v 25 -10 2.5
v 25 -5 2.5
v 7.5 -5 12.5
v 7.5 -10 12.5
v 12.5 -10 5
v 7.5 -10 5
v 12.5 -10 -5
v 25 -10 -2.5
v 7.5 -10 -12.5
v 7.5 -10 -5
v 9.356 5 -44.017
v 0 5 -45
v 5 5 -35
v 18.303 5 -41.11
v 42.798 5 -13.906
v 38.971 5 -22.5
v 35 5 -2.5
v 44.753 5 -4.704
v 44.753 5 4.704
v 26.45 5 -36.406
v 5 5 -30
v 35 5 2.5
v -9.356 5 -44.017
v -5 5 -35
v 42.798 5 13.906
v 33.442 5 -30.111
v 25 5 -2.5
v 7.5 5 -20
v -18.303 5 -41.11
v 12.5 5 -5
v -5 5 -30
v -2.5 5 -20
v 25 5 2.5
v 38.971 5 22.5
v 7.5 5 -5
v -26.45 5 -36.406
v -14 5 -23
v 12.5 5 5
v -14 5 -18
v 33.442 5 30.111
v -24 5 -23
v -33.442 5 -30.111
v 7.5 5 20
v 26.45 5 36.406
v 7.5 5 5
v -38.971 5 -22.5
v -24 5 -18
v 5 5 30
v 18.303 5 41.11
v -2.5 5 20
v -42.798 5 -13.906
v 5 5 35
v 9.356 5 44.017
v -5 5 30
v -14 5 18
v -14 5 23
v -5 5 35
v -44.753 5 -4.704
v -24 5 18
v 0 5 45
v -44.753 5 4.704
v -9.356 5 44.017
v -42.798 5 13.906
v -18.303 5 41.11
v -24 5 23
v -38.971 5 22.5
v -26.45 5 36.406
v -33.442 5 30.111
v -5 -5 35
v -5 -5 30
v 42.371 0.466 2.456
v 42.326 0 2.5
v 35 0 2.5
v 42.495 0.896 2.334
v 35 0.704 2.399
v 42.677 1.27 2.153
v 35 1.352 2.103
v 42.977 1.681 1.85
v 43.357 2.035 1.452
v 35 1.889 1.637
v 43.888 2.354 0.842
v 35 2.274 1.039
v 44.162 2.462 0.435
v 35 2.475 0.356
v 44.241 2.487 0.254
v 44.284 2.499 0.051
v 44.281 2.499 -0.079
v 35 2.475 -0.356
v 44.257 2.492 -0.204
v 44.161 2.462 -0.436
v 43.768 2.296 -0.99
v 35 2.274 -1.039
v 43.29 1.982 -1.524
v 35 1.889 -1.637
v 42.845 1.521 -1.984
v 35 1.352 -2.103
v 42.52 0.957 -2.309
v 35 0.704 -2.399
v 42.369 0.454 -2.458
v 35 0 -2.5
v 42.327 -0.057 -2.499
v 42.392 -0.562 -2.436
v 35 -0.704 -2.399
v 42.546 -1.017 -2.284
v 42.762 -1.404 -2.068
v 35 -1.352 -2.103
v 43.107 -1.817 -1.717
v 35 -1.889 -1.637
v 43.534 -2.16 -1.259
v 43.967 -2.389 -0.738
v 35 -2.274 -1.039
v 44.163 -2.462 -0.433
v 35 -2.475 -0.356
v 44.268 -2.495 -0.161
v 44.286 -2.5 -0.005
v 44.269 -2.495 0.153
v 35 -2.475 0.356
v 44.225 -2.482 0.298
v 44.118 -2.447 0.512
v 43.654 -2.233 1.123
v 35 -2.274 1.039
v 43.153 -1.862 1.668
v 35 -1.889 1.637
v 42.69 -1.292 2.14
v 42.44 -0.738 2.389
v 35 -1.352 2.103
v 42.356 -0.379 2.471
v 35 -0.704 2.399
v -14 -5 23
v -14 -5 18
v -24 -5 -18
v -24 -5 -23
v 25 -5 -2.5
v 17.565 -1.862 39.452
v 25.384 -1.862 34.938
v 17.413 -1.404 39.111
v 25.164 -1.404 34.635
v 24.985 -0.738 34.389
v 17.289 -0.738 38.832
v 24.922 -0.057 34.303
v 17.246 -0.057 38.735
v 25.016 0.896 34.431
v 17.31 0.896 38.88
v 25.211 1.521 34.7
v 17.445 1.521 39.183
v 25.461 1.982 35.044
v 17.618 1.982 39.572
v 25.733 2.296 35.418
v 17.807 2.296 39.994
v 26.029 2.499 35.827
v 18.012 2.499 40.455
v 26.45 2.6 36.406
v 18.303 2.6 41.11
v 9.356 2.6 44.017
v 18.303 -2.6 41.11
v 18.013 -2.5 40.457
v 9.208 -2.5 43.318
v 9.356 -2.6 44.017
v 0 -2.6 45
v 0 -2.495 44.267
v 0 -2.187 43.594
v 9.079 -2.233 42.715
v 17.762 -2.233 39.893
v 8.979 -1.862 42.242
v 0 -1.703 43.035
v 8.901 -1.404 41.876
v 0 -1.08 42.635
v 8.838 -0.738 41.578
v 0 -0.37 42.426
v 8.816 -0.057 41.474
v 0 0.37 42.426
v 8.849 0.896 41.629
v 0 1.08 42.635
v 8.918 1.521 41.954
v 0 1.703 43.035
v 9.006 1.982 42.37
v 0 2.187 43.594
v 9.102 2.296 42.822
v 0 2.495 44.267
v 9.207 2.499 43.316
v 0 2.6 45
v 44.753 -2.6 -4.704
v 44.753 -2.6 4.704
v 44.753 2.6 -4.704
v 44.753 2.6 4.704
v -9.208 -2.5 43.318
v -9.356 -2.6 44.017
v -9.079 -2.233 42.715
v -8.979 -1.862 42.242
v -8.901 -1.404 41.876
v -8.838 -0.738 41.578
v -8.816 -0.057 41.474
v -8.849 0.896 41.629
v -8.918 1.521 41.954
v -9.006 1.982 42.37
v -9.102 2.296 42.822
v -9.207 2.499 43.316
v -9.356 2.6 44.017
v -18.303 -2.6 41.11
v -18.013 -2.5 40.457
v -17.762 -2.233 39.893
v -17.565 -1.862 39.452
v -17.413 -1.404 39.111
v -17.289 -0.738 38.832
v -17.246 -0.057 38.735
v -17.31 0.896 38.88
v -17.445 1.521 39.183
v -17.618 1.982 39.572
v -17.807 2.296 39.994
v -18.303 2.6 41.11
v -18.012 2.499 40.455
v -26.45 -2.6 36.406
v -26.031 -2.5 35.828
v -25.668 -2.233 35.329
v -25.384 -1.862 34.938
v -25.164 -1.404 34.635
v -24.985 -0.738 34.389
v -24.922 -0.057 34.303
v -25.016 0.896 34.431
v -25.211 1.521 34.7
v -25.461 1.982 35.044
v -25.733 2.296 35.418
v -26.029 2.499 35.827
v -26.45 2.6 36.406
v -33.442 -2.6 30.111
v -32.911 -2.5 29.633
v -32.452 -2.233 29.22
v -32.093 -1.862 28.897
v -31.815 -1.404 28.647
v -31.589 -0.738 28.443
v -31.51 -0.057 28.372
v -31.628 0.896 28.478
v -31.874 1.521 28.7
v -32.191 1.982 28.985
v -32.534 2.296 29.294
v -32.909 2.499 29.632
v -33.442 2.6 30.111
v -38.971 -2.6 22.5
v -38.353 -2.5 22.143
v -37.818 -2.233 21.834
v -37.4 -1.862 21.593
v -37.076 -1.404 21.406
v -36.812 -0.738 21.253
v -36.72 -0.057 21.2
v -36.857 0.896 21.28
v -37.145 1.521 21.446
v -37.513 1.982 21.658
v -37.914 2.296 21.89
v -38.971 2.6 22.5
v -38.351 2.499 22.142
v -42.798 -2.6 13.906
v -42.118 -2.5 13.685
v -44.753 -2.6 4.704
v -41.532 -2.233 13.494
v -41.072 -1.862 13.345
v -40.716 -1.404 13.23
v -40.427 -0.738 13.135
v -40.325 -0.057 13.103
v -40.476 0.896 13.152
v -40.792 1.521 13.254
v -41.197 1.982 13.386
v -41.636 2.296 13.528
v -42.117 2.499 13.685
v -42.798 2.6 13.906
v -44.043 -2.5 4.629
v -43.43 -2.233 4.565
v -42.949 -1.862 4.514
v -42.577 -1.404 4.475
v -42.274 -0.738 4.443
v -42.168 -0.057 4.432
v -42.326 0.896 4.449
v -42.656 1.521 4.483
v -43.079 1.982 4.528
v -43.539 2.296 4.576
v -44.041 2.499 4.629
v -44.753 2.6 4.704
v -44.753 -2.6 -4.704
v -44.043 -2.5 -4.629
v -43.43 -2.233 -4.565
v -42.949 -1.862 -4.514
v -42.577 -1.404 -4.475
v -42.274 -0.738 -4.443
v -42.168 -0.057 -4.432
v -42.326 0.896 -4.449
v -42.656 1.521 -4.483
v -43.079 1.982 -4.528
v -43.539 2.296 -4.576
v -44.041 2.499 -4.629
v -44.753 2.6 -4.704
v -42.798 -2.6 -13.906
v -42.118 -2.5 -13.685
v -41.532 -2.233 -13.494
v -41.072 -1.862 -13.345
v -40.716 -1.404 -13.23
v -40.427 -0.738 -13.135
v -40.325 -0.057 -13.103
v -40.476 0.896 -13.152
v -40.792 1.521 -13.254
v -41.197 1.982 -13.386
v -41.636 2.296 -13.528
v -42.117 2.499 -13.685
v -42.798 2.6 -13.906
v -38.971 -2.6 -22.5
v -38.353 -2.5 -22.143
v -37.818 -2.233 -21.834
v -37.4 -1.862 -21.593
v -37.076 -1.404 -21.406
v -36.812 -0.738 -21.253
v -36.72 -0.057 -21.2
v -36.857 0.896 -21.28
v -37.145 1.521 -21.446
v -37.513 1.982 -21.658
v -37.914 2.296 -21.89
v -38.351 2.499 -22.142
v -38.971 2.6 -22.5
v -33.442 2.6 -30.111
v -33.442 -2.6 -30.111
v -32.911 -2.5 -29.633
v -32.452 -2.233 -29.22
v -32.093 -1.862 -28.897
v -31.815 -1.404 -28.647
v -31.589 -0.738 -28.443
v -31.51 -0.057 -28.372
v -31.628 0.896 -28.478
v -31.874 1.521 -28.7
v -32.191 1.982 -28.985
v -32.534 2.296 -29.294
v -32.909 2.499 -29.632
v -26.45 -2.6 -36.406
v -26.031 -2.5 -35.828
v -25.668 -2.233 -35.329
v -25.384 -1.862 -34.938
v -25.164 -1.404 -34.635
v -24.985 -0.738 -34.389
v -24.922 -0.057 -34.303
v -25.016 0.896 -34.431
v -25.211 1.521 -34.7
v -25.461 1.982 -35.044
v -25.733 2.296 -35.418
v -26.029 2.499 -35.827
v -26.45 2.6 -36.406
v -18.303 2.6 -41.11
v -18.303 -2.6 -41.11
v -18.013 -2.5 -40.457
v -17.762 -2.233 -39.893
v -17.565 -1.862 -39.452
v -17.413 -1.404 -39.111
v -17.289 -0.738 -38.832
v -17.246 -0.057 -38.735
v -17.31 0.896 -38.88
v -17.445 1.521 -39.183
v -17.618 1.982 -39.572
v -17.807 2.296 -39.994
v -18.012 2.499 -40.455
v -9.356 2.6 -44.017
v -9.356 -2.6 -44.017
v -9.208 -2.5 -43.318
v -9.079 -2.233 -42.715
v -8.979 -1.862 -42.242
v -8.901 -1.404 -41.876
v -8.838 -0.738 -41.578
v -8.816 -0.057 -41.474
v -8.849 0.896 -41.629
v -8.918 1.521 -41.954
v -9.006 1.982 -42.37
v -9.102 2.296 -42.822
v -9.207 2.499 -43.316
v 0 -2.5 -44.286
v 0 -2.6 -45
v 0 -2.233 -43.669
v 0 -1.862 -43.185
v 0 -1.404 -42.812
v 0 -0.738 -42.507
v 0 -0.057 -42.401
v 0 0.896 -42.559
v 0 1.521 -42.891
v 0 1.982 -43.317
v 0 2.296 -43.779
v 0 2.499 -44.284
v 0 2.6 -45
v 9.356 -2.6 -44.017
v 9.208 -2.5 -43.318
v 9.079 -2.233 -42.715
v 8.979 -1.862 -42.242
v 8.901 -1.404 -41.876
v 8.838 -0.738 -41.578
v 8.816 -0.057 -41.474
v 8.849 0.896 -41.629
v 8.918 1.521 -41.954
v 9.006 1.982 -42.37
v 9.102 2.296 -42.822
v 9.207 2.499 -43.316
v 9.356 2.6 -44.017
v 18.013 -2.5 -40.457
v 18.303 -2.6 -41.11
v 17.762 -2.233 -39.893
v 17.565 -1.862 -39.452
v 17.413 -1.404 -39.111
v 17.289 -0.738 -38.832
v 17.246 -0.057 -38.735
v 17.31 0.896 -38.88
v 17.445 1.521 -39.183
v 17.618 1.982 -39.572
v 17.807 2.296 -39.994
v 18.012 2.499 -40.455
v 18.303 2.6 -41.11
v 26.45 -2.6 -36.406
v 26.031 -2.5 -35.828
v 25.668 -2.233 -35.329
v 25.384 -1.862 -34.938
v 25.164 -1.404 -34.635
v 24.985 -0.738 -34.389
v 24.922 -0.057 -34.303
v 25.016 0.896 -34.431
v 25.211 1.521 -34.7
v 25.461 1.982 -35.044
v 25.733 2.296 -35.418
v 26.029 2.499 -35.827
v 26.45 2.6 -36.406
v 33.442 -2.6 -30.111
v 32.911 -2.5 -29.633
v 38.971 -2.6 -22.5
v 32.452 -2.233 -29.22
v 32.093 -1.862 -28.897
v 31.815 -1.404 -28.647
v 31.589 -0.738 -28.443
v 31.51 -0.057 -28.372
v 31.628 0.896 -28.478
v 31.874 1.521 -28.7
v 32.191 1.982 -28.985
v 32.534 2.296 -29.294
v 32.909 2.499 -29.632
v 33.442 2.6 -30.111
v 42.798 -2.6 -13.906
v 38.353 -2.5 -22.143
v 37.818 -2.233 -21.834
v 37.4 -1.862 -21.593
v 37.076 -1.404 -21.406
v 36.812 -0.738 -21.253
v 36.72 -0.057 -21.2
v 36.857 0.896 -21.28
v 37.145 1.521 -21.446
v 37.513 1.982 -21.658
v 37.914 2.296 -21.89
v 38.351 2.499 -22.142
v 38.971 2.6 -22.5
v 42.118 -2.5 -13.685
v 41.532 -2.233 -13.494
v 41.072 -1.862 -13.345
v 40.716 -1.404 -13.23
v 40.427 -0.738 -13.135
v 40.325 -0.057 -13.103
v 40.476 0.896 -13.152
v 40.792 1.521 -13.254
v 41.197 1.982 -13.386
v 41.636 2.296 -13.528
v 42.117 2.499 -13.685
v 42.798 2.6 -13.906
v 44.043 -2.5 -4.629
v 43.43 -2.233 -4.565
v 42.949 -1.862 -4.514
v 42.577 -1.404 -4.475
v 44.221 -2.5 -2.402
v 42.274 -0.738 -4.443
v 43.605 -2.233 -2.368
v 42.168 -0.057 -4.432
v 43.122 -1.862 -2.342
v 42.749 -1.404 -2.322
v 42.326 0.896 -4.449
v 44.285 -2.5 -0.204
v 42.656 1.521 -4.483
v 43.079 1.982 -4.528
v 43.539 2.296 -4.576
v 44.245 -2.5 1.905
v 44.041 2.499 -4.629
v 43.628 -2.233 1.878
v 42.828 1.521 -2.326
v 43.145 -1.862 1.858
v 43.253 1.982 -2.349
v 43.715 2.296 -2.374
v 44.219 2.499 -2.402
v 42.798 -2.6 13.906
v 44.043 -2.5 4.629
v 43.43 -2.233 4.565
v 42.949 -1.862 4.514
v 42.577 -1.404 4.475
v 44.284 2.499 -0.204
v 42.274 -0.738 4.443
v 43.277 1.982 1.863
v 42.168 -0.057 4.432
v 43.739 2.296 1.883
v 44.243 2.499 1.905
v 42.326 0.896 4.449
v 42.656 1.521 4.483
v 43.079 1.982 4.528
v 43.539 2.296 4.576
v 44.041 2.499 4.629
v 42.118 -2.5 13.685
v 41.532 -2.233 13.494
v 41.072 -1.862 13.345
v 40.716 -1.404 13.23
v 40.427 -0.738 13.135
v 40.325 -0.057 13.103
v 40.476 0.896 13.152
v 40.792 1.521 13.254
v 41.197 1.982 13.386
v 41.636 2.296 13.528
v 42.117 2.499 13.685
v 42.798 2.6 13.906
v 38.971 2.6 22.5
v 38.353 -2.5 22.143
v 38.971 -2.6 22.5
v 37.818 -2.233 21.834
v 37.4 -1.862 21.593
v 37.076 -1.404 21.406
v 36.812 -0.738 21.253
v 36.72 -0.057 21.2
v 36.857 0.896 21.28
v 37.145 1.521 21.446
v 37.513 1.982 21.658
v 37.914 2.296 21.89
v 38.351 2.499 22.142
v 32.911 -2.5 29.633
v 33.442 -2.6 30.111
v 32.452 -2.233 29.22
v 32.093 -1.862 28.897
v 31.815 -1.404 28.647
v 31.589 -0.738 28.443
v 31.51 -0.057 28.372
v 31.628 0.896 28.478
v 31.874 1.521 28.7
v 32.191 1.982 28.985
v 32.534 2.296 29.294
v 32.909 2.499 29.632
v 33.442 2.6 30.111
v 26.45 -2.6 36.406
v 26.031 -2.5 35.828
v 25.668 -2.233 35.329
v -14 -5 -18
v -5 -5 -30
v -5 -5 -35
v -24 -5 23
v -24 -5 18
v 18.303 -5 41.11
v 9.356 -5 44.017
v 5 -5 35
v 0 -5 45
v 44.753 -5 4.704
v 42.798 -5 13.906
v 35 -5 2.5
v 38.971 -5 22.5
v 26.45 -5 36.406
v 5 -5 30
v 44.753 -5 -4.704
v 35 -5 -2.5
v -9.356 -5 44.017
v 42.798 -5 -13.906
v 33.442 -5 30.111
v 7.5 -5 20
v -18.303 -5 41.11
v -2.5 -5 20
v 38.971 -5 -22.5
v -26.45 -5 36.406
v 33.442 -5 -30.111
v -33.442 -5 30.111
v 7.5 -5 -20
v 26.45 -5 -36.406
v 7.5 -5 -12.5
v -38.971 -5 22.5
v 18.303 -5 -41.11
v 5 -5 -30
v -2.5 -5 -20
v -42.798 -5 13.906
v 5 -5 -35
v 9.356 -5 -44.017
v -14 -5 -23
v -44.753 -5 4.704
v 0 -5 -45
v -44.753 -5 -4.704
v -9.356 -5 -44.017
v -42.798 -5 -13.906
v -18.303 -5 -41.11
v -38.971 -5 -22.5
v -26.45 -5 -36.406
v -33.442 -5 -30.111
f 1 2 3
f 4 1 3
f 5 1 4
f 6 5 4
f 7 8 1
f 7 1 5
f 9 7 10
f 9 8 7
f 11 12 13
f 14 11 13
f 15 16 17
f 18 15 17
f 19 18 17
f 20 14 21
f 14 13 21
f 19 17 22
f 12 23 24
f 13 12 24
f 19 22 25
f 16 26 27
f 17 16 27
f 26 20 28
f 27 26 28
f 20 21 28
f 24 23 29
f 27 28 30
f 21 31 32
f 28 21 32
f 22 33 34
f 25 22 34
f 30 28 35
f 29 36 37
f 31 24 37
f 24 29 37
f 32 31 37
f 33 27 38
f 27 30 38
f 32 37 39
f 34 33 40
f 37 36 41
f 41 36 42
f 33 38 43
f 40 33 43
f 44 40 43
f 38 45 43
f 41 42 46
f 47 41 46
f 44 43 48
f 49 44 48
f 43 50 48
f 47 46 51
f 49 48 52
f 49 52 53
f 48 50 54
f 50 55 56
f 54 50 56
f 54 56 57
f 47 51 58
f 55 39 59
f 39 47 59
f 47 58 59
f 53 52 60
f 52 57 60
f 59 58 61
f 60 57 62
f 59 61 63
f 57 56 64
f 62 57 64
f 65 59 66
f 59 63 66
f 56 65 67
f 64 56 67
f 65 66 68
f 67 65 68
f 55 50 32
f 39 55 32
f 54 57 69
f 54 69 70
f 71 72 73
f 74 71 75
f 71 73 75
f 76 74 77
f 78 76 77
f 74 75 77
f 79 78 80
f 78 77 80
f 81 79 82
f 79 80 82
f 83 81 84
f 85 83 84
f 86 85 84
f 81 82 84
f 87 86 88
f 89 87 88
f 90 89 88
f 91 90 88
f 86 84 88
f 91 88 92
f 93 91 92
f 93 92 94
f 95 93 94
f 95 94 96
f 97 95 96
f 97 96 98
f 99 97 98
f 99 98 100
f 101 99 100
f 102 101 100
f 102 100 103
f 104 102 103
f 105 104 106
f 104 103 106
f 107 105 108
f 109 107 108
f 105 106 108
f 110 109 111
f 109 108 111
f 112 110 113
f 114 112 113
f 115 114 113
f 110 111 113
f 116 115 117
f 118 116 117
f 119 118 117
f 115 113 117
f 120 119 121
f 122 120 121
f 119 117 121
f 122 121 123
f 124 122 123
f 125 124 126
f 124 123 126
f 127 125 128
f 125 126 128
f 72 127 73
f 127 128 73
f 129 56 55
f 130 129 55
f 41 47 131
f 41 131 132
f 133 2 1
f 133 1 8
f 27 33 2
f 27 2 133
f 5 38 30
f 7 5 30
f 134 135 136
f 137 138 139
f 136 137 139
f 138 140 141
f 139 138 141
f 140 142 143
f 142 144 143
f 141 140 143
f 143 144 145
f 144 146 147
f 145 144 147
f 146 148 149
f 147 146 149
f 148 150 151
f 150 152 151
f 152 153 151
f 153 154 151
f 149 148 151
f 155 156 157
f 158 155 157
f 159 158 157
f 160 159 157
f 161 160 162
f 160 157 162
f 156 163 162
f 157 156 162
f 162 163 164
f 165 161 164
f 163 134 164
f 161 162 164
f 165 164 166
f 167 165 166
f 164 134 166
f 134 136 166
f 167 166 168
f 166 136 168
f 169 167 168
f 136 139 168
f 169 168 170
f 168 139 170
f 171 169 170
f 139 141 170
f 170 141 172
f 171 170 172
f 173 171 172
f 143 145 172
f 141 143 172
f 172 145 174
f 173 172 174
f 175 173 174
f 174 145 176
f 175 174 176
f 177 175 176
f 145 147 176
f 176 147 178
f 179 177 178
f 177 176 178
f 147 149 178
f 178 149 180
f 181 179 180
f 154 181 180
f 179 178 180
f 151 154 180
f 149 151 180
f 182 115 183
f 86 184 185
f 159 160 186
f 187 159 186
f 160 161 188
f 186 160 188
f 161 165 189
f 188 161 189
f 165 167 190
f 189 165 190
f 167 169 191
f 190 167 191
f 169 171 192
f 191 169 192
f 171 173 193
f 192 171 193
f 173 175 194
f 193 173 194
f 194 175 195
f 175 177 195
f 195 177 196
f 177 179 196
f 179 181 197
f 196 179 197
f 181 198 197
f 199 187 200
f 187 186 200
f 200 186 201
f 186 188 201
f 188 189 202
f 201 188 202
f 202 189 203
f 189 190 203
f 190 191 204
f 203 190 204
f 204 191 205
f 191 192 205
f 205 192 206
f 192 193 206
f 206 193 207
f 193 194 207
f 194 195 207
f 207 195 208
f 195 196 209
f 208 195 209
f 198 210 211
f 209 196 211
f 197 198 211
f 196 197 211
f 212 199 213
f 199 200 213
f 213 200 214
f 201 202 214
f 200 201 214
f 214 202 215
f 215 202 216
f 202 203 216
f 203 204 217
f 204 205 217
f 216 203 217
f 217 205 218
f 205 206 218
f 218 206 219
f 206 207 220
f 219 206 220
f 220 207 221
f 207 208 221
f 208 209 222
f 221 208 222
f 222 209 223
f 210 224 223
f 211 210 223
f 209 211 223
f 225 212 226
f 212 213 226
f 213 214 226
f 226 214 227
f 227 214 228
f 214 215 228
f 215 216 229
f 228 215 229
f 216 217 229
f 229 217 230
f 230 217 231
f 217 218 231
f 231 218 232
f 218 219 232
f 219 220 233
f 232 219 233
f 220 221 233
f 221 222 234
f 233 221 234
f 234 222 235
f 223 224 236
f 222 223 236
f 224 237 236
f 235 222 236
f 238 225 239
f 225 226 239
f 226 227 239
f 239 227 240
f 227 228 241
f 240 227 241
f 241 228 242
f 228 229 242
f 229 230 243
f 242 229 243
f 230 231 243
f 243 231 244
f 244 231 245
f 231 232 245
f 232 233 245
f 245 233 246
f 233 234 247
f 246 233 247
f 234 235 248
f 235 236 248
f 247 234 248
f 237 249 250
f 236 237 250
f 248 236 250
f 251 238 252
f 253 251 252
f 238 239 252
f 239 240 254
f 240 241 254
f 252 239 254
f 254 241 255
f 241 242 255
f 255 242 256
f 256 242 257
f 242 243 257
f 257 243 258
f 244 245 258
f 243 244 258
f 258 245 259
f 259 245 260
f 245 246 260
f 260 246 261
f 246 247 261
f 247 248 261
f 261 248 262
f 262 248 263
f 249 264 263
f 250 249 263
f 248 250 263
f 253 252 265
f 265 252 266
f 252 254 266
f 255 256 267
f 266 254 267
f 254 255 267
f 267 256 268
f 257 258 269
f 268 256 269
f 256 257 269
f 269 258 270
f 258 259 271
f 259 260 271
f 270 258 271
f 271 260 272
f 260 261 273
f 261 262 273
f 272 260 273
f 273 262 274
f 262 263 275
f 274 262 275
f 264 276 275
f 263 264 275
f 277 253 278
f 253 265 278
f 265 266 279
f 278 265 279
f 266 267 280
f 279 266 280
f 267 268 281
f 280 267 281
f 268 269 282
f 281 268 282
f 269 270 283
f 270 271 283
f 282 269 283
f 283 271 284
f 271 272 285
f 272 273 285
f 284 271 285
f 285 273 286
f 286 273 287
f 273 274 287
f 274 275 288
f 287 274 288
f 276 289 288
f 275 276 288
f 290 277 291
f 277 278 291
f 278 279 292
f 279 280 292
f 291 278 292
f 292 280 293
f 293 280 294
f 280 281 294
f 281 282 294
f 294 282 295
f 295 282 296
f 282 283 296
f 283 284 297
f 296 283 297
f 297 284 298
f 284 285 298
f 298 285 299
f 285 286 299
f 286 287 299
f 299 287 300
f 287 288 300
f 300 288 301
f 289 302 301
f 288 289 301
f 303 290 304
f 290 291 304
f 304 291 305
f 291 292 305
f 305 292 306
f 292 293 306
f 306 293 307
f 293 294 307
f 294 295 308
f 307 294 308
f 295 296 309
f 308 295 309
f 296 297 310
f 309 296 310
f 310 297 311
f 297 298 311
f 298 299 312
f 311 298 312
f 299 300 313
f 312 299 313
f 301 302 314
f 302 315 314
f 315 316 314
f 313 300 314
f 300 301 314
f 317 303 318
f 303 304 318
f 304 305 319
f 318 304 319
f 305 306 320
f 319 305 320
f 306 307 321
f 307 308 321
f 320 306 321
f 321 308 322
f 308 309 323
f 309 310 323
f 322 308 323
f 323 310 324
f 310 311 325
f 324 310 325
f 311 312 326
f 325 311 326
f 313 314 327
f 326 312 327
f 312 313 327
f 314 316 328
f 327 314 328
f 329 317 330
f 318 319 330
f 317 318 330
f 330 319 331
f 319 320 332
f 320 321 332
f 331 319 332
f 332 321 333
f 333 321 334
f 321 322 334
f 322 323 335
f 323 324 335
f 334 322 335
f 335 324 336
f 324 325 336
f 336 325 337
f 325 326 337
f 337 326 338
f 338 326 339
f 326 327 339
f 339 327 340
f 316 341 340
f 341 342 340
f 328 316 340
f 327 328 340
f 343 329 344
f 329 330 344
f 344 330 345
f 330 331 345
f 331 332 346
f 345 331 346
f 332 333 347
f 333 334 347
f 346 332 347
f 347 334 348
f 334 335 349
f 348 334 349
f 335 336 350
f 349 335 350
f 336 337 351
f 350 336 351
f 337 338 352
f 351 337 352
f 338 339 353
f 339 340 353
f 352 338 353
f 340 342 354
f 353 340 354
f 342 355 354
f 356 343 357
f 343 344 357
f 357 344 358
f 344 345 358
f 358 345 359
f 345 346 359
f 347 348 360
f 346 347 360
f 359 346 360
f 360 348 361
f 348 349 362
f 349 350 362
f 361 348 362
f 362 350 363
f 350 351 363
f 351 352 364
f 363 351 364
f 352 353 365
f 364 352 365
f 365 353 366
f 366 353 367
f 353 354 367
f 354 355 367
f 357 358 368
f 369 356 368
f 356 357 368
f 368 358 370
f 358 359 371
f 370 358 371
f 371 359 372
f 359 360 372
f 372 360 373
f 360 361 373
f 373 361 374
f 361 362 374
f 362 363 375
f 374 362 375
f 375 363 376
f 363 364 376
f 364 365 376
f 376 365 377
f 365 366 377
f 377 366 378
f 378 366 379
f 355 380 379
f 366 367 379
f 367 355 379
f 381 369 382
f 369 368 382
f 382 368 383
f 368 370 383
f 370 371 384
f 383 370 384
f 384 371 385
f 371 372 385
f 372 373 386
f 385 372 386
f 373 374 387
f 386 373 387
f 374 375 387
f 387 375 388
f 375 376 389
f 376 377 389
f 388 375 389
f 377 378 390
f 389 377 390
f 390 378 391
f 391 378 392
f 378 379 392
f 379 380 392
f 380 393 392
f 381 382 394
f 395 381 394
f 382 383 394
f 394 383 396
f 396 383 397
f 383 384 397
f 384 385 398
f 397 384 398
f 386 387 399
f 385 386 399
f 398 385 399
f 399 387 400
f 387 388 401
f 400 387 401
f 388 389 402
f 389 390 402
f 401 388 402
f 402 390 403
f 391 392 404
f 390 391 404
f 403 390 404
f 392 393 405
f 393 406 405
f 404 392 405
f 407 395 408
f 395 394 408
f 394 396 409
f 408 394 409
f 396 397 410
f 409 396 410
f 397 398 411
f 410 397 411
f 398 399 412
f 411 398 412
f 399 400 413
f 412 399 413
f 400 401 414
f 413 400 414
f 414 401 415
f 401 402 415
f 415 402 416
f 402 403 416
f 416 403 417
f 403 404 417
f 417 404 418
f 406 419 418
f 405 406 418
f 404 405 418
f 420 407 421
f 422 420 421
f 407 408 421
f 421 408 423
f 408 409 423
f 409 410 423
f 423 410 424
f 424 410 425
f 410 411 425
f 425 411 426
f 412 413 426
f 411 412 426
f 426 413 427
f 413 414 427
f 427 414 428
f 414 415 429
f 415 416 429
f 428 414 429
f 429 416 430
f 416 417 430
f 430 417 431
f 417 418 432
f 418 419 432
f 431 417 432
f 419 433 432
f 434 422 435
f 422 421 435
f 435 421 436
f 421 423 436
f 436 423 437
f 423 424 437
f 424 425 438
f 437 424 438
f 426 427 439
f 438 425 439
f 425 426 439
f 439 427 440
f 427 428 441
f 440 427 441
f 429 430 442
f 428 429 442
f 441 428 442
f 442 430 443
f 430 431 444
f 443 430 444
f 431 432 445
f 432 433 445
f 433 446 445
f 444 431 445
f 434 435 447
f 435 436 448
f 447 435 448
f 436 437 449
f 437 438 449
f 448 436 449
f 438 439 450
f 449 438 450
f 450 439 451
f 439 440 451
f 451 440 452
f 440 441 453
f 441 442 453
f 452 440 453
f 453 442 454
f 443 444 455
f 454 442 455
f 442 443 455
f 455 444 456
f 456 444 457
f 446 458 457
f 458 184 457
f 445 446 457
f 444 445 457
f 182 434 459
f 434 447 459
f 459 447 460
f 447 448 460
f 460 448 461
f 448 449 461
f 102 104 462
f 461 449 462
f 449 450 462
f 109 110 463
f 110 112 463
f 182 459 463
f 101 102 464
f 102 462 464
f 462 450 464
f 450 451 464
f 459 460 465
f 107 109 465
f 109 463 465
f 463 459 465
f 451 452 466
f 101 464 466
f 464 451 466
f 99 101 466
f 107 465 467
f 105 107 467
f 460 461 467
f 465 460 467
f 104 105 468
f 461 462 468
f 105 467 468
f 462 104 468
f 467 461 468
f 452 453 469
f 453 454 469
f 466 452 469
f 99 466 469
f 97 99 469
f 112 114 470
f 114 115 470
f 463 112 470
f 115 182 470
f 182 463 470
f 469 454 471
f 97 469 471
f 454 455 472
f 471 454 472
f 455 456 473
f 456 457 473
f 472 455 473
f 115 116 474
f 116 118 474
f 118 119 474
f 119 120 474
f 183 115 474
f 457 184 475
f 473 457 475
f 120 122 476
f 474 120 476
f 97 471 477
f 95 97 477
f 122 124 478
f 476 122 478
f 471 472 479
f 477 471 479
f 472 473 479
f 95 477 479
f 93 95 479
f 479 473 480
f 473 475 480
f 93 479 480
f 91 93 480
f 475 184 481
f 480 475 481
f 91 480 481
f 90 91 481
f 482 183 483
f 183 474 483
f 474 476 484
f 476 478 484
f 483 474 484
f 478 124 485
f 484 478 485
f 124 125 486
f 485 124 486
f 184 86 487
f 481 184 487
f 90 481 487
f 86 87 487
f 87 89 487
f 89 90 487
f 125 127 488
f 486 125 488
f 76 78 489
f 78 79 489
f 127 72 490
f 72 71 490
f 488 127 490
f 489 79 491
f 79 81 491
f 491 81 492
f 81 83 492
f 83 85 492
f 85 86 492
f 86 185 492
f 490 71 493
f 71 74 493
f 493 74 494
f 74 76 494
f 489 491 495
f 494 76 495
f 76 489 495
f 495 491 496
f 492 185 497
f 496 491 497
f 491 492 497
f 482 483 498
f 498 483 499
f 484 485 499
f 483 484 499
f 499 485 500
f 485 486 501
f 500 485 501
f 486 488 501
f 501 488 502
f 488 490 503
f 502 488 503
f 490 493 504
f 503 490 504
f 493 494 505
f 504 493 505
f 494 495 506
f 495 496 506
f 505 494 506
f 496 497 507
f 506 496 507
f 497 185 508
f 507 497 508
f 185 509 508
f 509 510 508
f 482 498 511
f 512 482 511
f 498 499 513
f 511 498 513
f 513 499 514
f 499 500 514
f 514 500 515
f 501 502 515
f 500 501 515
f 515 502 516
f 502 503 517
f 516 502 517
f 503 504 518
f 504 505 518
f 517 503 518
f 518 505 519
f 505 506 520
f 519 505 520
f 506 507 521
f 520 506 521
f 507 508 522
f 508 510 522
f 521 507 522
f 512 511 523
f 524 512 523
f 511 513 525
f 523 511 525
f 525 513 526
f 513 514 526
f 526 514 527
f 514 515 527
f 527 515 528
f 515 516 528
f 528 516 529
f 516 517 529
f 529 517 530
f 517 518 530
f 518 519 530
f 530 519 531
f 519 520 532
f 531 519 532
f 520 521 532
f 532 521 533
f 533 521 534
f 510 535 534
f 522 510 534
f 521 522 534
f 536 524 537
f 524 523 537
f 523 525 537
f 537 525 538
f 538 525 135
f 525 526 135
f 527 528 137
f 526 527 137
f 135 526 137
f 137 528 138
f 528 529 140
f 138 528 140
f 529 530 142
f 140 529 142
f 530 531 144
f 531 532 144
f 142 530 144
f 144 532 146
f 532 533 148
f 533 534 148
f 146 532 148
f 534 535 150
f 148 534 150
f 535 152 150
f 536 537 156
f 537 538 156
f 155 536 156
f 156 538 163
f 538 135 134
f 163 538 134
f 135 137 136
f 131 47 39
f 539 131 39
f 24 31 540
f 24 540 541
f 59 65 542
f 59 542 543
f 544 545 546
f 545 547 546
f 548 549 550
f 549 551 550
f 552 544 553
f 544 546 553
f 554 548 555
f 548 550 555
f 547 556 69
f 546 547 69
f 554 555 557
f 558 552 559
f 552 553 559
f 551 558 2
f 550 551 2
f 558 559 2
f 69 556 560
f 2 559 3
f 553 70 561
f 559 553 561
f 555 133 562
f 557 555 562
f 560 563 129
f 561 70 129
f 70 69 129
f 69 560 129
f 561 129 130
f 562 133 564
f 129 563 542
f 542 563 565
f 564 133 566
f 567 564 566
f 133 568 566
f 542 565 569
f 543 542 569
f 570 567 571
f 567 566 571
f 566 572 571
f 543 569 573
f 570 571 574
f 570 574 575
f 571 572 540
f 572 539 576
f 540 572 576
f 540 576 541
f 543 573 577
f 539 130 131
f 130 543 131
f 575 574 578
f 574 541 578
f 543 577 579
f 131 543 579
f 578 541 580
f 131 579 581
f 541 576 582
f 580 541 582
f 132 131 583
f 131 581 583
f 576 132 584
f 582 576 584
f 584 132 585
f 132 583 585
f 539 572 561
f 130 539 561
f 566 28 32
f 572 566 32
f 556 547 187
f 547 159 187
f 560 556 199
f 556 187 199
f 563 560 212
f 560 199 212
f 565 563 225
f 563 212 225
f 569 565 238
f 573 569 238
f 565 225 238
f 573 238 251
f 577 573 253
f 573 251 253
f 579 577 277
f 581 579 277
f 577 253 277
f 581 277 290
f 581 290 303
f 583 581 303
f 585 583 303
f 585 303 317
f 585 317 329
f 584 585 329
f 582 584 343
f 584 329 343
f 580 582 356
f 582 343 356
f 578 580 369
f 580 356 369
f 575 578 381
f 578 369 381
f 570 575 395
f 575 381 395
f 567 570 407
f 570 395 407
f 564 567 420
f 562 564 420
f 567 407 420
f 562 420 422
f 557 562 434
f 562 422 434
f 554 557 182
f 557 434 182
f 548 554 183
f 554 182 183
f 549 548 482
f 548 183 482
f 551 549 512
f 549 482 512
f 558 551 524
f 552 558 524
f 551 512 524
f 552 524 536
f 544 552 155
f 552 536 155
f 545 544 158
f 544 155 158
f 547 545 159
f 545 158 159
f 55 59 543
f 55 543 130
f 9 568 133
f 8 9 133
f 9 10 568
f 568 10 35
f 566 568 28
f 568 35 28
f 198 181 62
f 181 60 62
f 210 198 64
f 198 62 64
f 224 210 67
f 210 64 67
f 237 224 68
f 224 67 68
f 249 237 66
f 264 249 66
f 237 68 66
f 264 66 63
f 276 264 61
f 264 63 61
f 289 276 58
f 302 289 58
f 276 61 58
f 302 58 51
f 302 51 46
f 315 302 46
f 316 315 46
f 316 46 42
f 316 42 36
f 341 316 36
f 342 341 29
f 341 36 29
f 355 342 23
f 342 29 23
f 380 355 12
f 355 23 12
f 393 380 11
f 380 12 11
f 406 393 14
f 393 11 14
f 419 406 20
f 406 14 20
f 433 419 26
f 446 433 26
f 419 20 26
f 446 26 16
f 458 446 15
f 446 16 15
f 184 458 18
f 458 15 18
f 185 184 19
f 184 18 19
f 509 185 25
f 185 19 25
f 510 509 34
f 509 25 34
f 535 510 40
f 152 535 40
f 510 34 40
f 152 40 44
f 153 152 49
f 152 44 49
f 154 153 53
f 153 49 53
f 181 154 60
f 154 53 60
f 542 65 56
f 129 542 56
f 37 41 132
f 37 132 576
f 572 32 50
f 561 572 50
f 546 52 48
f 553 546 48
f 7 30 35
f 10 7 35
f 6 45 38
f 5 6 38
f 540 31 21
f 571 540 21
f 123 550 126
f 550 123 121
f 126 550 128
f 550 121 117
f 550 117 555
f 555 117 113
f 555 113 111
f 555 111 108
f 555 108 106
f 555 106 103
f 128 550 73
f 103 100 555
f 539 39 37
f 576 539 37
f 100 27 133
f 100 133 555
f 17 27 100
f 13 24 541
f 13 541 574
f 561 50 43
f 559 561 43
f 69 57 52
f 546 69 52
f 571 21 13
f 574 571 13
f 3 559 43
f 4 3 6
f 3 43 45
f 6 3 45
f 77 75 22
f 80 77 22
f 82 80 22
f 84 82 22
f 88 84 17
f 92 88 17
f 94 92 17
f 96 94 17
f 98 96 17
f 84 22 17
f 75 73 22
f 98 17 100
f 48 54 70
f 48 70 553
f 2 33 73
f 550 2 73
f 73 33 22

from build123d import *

# Parameters (mm, degrees)
CROQUIS2_W              = 10
CROQUIS2_H              = 5
CORTAR_EXTRUIR1_DEPTH   = 10
CROQUIS3_R              = 2.5
CORTAR_EXTRUIR2_DEPTH   = 50
SALIENTE_EXTRUIR1_DEPTH = 15
CROQUIS5_W              = 10
CROQUIS5_H              = 5
CORTAR_EXTRUIR3_DEPTH   = 10


with BuildPart() as part:
    # Croquis1 → Revolución1 (revolve)
    with BuildSketch(Plane(origin=(0, 0, 0), x_dir=(0, 0, -1), z_dir=(1, 0, 0))):
        with BuildLine():
            Line((-45, 2.6), (-45, 5))
            Line((-45, 5), (0, 5))
            Line((0, 5), (0, -5))
            Line((0, -5), (-45, -5))
            Line((-45, -5), (-45, -2.6))
            ThreePointArc((-45, -2.6), (-42.4, 0), (-45, 2.6))
        make_face()
    revolve(axis=Axis((0, 59.07084426, 0), (0, -1, 0)))

    # Croquis2 → Cortar-Extruir1 (cut)
    with BuildSketch(Plane(origin=(0, 5, 0), x_dir=(1, 0, 0), z_dir=(0, 1, 0))):
        Polygon((7.5, 5), (7.5, 20), (-2.5, 20), (-2.5, -20), (7.5, -20), (7.5, -5), (12.5, -5), (12.5, 5), align=None)
        with Locations((0, 32.5)):
            Rectangle(CROQUIS2_W, CROQUIS2_H)
        with Locations((0, -32.5)):
            Rectangle(CROQUIS2_W, CROQUIS2_H)
        with Locations((30, 0)):
            Rectangle(CROQUIS2_W, CROQUIS2_H)
    extrude(amount=-CORTAR_EXTRUIR1_DEPTH, mode=Mode.SUBTRACT)

    # Croquis3 → Cortar-Extruir2 (cut)
    with BuildSketch(Plane.ZY.offset(-12.5)):
        Circle(CROQUIS3_R)
    extrude(amount=-CORTAR_EXTRUIR2_DEPTH, mode=Mode.SUBTRACT)

    # Croquis4 → Saliente-Extruir1 (add)
    with BuildSketch(Plane(origin=(0, 5, 0), x_dir=(1, 0, 0), z_dir=(0, 1, 0))):
        Polygon((7.5, 12.5), (25, 2.5), (25, -2.5), (7.5, -12.5), (7.5, -5), (12.5, -5), (12.5, 5), (7.5, 5), align=None)
    extrude(amount=-SALIENTE_EXTRUIR1_DEPTH)

    # Croquis5 → Cortar-Extruir3 (cut)
    with BuildSketch(Plane(origin=(0, 5, 0), x_dir=(1, 0, 0), z_dir=(0, 1, 0))):
        with Locations((-19, -20.5)):
            Rectangle(CROQUIS5_W, CROQUIS5_H)
        with Locations((-19, 20.5)):
            Rectangle(CROQUIS5_W, CROQUIS5_H)
    extrude(amount=-CORTAR_EXTRUIR3_DEPTH, mode=Mode.SUBTRACT)


solid = part.part
